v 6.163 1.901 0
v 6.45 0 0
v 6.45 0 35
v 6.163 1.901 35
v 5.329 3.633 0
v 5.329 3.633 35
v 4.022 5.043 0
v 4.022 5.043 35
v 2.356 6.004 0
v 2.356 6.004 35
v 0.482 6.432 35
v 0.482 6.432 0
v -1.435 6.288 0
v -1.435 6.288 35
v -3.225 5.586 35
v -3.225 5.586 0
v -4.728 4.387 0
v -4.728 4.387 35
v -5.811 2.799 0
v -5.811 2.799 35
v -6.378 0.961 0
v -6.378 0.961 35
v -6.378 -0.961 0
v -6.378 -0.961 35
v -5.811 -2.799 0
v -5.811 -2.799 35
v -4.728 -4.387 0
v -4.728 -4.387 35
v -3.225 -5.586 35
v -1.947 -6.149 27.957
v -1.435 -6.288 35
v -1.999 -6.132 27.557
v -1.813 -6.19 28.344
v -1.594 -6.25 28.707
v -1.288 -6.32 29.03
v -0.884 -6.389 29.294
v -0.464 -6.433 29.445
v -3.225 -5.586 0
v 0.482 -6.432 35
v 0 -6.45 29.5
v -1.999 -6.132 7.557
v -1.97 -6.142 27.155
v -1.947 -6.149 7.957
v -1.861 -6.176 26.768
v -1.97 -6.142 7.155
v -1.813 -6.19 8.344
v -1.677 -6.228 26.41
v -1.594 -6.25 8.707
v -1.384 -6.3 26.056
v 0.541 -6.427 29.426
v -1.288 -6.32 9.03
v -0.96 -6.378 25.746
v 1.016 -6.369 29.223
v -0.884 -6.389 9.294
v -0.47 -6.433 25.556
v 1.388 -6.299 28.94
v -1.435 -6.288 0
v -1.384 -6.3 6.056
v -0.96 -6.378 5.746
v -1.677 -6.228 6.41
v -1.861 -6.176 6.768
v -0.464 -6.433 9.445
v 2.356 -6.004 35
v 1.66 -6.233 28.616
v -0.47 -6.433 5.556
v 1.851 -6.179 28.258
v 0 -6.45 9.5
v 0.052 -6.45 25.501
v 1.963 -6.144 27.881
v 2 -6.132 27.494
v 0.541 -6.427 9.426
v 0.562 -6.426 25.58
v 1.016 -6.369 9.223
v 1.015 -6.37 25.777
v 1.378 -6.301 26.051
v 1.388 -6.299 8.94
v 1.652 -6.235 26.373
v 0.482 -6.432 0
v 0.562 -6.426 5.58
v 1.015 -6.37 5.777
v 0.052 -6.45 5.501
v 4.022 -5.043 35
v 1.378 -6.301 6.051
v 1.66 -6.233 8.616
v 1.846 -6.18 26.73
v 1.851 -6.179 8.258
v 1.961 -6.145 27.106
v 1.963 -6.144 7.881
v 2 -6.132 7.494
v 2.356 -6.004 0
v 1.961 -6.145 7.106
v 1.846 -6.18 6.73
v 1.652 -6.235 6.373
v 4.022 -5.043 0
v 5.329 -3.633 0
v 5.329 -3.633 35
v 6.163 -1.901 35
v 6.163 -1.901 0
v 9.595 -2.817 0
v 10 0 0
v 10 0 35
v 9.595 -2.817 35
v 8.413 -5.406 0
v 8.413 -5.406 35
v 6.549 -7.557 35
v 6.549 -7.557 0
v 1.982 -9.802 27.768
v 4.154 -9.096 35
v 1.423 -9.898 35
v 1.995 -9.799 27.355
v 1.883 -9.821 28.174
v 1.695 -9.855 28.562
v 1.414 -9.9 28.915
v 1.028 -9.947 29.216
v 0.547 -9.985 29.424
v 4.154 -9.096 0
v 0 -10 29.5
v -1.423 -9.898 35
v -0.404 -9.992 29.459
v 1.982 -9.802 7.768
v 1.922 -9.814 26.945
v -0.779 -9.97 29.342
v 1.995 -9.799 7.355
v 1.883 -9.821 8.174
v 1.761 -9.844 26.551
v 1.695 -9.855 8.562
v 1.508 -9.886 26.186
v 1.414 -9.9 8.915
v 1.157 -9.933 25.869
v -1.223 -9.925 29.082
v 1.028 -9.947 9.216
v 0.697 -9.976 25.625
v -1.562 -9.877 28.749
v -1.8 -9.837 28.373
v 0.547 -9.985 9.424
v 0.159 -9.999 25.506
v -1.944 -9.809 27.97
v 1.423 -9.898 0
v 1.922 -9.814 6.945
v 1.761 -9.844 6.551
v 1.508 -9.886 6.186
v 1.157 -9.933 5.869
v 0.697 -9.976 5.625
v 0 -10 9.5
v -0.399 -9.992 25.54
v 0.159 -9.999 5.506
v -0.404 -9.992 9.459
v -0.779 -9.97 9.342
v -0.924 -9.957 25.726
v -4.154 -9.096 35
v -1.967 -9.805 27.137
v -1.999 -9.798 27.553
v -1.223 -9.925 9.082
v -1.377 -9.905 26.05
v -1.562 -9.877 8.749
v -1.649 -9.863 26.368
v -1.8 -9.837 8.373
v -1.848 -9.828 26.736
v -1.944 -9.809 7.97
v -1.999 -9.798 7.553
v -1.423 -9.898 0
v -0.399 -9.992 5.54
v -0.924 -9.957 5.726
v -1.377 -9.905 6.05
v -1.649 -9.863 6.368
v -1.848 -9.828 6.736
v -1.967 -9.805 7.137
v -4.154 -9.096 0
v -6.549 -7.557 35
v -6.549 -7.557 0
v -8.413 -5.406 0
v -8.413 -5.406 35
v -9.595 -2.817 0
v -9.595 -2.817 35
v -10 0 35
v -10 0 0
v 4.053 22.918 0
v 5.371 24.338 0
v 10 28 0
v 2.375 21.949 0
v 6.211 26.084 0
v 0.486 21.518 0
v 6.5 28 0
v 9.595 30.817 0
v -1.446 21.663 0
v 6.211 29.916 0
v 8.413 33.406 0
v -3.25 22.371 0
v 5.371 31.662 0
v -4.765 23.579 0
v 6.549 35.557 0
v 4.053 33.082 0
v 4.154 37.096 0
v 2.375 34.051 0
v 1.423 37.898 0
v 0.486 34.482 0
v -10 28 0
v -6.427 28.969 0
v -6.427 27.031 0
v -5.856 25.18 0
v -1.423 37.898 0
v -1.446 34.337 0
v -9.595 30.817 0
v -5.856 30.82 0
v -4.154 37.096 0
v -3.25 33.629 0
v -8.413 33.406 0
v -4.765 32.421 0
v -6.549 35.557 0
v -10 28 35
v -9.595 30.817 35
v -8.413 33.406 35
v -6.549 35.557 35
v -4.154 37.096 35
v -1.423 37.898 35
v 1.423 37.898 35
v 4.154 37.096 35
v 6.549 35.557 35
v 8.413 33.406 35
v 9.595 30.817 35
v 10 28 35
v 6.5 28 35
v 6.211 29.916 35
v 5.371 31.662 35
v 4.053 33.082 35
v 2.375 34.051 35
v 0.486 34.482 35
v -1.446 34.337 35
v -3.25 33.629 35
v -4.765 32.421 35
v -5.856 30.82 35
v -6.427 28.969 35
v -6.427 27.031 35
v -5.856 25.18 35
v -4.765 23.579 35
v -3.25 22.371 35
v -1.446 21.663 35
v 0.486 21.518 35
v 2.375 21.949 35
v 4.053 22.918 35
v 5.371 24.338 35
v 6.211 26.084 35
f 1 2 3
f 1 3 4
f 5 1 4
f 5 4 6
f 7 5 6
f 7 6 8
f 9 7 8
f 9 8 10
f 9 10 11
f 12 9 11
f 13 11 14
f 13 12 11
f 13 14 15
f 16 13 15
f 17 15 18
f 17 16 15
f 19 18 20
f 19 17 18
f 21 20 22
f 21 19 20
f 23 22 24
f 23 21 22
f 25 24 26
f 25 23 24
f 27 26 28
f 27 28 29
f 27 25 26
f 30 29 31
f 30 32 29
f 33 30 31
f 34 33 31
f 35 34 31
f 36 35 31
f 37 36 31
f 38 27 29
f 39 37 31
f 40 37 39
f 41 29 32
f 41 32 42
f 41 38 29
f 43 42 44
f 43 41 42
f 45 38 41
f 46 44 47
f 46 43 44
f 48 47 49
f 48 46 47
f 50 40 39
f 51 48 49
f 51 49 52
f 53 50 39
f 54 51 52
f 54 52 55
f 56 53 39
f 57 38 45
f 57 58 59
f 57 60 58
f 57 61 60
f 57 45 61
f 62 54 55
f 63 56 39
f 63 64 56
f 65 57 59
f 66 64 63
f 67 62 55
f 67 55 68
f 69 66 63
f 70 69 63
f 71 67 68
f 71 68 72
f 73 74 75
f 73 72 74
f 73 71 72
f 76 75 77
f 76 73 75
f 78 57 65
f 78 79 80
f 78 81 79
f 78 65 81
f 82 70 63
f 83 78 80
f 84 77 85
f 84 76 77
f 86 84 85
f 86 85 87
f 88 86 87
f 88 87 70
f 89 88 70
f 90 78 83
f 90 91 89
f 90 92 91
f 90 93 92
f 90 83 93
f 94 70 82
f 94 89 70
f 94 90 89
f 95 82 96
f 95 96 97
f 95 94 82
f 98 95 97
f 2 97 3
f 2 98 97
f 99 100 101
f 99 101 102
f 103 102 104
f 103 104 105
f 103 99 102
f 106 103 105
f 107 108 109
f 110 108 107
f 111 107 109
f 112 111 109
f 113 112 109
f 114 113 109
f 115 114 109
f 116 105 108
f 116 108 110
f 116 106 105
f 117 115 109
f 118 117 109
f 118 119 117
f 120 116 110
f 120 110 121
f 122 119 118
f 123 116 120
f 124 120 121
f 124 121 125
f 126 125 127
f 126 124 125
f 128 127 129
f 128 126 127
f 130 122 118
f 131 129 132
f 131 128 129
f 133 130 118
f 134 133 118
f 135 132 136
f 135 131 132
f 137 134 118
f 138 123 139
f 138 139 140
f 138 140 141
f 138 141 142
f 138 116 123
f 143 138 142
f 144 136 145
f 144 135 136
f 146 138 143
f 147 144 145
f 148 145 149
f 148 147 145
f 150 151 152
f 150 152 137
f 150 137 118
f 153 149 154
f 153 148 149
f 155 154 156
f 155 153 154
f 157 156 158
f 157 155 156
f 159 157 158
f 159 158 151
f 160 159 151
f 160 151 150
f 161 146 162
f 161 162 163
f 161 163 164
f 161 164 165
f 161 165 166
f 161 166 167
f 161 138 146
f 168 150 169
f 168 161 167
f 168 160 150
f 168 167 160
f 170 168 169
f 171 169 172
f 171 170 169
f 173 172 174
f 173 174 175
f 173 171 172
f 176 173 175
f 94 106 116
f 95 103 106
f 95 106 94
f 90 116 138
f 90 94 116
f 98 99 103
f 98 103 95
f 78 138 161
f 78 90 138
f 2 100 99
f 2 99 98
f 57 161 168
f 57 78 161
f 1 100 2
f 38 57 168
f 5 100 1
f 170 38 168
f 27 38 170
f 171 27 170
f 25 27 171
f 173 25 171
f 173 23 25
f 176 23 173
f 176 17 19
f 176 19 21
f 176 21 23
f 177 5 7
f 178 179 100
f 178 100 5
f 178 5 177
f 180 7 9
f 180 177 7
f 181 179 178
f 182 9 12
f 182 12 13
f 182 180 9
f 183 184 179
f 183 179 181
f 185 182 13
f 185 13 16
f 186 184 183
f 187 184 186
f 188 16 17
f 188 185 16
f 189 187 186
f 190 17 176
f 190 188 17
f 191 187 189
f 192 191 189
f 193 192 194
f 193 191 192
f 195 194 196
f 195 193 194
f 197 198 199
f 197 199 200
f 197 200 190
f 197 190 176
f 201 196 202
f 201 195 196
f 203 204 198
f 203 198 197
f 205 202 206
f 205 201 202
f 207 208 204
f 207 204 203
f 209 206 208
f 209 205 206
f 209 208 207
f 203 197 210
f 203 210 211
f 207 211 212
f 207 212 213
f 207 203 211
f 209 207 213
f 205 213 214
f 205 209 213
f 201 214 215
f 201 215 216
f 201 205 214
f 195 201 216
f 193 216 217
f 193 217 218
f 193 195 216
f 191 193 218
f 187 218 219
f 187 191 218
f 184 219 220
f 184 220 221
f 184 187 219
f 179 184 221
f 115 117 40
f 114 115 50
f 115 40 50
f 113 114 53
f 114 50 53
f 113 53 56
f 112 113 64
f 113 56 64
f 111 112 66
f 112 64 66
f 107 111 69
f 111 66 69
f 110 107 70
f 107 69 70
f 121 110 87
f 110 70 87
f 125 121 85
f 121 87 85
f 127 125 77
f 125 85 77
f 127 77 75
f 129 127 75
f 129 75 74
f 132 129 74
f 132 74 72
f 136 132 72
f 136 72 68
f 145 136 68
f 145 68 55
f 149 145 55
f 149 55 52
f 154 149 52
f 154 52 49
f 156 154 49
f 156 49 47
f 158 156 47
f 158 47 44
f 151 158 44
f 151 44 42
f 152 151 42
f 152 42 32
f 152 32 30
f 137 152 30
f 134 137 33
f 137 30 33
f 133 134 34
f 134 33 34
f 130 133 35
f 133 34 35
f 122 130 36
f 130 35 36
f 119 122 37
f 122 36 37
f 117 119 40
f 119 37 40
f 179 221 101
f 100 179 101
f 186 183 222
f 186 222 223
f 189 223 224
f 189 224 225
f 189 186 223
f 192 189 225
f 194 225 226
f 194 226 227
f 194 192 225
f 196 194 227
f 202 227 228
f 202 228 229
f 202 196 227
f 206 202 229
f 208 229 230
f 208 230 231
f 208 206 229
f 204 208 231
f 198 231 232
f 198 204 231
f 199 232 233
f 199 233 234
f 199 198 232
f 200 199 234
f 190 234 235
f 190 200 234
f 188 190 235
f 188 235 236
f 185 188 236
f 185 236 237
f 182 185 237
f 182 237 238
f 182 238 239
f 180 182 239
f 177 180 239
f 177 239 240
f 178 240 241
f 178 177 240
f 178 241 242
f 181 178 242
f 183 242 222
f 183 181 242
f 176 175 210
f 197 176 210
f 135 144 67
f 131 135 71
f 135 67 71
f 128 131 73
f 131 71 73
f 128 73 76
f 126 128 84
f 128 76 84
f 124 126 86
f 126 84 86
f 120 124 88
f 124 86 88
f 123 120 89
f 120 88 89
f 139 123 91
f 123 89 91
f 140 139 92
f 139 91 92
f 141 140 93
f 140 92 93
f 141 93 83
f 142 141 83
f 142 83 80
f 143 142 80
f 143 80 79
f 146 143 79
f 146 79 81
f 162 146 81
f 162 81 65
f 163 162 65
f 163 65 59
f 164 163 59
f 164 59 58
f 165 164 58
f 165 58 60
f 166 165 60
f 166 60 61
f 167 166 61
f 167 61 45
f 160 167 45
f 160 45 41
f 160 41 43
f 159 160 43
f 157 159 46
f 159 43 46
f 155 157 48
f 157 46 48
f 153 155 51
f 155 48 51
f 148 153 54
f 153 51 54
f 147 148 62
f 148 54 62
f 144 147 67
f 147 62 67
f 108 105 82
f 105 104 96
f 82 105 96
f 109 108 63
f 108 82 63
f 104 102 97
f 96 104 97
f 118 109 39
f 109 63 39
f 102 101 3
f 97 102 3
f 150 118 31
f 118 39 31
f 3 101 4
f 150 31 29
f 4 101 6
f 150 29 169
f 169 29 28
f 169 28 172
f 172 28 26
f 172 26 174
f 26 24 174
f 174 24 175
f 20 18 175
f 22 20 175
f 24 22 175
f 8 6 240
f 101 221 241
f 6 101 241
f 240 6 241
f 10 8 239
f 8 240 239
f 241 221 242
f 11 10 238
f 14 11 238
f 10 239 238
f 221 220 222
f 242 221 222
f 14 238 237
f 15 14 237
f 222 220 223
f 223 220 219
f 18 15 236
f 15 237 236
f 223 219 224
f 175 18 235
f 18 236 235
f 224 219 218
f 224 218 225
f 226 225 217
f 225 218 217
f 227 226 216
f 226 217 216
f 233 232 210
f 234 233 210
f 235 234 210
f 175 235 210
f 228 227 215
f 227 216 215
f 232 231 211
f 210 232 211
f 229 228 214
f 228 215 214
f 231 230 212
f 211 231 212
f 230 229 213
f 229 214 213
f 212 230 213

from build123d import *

# Parameters (mm, degrees)
CROQUIS1_R              = 6.45
CROQUIS1_R_2            = 6.5
SALIENTE_EXTRUIR1_DEPTH = 35
CROQUIS2_R              = 2
CORTAR_EXTRUIR1_DEPTH   = 10


with BuildPart() as part:
    # Croquis1 → Saliente-Extruir1 (new body)
    with BuildSketch(Plane.XY):
        with BuildLine():
            Line((10, 28), (10, 0))
            ThreePointArc((10, 0), (0, -10), (-10, 0))
            Line((-10, 0), (-10, 28))
            ThreePointArc((-10, 28), (0, 38), (10, 28))
        make_face()
        Circle(CROQUIS1_R, mode=Mode.SUBTRACT)
        with Locations((0, 28)):
            Circle(CROQUIS1_R_2, mode=Mode.SUBTRACT)
    extrude(amount=SALIENTE_EXTRUIR1_DEPTH)

    # Croquis2 → Cortar-Extruir1 (cut)
    with BuildSketch(Plane(origin=(0, 0, 0), x_dir=(1, 0, 0), z_dir=(0, 1, 0))):
        with Locations(Location((0, -7.5, 0), (0, 0, 270))):
            Circle(CROQUIS2_R)
        with Locations(Location((0, -27.5, 0), (0, 0, 270))):
            Circle(CROQUIS2_R)
    extrude(amount=-CORTAR_EXTRUIR1_DEPTH, mode=Mode.SUBTRACT)


solid = part.part
